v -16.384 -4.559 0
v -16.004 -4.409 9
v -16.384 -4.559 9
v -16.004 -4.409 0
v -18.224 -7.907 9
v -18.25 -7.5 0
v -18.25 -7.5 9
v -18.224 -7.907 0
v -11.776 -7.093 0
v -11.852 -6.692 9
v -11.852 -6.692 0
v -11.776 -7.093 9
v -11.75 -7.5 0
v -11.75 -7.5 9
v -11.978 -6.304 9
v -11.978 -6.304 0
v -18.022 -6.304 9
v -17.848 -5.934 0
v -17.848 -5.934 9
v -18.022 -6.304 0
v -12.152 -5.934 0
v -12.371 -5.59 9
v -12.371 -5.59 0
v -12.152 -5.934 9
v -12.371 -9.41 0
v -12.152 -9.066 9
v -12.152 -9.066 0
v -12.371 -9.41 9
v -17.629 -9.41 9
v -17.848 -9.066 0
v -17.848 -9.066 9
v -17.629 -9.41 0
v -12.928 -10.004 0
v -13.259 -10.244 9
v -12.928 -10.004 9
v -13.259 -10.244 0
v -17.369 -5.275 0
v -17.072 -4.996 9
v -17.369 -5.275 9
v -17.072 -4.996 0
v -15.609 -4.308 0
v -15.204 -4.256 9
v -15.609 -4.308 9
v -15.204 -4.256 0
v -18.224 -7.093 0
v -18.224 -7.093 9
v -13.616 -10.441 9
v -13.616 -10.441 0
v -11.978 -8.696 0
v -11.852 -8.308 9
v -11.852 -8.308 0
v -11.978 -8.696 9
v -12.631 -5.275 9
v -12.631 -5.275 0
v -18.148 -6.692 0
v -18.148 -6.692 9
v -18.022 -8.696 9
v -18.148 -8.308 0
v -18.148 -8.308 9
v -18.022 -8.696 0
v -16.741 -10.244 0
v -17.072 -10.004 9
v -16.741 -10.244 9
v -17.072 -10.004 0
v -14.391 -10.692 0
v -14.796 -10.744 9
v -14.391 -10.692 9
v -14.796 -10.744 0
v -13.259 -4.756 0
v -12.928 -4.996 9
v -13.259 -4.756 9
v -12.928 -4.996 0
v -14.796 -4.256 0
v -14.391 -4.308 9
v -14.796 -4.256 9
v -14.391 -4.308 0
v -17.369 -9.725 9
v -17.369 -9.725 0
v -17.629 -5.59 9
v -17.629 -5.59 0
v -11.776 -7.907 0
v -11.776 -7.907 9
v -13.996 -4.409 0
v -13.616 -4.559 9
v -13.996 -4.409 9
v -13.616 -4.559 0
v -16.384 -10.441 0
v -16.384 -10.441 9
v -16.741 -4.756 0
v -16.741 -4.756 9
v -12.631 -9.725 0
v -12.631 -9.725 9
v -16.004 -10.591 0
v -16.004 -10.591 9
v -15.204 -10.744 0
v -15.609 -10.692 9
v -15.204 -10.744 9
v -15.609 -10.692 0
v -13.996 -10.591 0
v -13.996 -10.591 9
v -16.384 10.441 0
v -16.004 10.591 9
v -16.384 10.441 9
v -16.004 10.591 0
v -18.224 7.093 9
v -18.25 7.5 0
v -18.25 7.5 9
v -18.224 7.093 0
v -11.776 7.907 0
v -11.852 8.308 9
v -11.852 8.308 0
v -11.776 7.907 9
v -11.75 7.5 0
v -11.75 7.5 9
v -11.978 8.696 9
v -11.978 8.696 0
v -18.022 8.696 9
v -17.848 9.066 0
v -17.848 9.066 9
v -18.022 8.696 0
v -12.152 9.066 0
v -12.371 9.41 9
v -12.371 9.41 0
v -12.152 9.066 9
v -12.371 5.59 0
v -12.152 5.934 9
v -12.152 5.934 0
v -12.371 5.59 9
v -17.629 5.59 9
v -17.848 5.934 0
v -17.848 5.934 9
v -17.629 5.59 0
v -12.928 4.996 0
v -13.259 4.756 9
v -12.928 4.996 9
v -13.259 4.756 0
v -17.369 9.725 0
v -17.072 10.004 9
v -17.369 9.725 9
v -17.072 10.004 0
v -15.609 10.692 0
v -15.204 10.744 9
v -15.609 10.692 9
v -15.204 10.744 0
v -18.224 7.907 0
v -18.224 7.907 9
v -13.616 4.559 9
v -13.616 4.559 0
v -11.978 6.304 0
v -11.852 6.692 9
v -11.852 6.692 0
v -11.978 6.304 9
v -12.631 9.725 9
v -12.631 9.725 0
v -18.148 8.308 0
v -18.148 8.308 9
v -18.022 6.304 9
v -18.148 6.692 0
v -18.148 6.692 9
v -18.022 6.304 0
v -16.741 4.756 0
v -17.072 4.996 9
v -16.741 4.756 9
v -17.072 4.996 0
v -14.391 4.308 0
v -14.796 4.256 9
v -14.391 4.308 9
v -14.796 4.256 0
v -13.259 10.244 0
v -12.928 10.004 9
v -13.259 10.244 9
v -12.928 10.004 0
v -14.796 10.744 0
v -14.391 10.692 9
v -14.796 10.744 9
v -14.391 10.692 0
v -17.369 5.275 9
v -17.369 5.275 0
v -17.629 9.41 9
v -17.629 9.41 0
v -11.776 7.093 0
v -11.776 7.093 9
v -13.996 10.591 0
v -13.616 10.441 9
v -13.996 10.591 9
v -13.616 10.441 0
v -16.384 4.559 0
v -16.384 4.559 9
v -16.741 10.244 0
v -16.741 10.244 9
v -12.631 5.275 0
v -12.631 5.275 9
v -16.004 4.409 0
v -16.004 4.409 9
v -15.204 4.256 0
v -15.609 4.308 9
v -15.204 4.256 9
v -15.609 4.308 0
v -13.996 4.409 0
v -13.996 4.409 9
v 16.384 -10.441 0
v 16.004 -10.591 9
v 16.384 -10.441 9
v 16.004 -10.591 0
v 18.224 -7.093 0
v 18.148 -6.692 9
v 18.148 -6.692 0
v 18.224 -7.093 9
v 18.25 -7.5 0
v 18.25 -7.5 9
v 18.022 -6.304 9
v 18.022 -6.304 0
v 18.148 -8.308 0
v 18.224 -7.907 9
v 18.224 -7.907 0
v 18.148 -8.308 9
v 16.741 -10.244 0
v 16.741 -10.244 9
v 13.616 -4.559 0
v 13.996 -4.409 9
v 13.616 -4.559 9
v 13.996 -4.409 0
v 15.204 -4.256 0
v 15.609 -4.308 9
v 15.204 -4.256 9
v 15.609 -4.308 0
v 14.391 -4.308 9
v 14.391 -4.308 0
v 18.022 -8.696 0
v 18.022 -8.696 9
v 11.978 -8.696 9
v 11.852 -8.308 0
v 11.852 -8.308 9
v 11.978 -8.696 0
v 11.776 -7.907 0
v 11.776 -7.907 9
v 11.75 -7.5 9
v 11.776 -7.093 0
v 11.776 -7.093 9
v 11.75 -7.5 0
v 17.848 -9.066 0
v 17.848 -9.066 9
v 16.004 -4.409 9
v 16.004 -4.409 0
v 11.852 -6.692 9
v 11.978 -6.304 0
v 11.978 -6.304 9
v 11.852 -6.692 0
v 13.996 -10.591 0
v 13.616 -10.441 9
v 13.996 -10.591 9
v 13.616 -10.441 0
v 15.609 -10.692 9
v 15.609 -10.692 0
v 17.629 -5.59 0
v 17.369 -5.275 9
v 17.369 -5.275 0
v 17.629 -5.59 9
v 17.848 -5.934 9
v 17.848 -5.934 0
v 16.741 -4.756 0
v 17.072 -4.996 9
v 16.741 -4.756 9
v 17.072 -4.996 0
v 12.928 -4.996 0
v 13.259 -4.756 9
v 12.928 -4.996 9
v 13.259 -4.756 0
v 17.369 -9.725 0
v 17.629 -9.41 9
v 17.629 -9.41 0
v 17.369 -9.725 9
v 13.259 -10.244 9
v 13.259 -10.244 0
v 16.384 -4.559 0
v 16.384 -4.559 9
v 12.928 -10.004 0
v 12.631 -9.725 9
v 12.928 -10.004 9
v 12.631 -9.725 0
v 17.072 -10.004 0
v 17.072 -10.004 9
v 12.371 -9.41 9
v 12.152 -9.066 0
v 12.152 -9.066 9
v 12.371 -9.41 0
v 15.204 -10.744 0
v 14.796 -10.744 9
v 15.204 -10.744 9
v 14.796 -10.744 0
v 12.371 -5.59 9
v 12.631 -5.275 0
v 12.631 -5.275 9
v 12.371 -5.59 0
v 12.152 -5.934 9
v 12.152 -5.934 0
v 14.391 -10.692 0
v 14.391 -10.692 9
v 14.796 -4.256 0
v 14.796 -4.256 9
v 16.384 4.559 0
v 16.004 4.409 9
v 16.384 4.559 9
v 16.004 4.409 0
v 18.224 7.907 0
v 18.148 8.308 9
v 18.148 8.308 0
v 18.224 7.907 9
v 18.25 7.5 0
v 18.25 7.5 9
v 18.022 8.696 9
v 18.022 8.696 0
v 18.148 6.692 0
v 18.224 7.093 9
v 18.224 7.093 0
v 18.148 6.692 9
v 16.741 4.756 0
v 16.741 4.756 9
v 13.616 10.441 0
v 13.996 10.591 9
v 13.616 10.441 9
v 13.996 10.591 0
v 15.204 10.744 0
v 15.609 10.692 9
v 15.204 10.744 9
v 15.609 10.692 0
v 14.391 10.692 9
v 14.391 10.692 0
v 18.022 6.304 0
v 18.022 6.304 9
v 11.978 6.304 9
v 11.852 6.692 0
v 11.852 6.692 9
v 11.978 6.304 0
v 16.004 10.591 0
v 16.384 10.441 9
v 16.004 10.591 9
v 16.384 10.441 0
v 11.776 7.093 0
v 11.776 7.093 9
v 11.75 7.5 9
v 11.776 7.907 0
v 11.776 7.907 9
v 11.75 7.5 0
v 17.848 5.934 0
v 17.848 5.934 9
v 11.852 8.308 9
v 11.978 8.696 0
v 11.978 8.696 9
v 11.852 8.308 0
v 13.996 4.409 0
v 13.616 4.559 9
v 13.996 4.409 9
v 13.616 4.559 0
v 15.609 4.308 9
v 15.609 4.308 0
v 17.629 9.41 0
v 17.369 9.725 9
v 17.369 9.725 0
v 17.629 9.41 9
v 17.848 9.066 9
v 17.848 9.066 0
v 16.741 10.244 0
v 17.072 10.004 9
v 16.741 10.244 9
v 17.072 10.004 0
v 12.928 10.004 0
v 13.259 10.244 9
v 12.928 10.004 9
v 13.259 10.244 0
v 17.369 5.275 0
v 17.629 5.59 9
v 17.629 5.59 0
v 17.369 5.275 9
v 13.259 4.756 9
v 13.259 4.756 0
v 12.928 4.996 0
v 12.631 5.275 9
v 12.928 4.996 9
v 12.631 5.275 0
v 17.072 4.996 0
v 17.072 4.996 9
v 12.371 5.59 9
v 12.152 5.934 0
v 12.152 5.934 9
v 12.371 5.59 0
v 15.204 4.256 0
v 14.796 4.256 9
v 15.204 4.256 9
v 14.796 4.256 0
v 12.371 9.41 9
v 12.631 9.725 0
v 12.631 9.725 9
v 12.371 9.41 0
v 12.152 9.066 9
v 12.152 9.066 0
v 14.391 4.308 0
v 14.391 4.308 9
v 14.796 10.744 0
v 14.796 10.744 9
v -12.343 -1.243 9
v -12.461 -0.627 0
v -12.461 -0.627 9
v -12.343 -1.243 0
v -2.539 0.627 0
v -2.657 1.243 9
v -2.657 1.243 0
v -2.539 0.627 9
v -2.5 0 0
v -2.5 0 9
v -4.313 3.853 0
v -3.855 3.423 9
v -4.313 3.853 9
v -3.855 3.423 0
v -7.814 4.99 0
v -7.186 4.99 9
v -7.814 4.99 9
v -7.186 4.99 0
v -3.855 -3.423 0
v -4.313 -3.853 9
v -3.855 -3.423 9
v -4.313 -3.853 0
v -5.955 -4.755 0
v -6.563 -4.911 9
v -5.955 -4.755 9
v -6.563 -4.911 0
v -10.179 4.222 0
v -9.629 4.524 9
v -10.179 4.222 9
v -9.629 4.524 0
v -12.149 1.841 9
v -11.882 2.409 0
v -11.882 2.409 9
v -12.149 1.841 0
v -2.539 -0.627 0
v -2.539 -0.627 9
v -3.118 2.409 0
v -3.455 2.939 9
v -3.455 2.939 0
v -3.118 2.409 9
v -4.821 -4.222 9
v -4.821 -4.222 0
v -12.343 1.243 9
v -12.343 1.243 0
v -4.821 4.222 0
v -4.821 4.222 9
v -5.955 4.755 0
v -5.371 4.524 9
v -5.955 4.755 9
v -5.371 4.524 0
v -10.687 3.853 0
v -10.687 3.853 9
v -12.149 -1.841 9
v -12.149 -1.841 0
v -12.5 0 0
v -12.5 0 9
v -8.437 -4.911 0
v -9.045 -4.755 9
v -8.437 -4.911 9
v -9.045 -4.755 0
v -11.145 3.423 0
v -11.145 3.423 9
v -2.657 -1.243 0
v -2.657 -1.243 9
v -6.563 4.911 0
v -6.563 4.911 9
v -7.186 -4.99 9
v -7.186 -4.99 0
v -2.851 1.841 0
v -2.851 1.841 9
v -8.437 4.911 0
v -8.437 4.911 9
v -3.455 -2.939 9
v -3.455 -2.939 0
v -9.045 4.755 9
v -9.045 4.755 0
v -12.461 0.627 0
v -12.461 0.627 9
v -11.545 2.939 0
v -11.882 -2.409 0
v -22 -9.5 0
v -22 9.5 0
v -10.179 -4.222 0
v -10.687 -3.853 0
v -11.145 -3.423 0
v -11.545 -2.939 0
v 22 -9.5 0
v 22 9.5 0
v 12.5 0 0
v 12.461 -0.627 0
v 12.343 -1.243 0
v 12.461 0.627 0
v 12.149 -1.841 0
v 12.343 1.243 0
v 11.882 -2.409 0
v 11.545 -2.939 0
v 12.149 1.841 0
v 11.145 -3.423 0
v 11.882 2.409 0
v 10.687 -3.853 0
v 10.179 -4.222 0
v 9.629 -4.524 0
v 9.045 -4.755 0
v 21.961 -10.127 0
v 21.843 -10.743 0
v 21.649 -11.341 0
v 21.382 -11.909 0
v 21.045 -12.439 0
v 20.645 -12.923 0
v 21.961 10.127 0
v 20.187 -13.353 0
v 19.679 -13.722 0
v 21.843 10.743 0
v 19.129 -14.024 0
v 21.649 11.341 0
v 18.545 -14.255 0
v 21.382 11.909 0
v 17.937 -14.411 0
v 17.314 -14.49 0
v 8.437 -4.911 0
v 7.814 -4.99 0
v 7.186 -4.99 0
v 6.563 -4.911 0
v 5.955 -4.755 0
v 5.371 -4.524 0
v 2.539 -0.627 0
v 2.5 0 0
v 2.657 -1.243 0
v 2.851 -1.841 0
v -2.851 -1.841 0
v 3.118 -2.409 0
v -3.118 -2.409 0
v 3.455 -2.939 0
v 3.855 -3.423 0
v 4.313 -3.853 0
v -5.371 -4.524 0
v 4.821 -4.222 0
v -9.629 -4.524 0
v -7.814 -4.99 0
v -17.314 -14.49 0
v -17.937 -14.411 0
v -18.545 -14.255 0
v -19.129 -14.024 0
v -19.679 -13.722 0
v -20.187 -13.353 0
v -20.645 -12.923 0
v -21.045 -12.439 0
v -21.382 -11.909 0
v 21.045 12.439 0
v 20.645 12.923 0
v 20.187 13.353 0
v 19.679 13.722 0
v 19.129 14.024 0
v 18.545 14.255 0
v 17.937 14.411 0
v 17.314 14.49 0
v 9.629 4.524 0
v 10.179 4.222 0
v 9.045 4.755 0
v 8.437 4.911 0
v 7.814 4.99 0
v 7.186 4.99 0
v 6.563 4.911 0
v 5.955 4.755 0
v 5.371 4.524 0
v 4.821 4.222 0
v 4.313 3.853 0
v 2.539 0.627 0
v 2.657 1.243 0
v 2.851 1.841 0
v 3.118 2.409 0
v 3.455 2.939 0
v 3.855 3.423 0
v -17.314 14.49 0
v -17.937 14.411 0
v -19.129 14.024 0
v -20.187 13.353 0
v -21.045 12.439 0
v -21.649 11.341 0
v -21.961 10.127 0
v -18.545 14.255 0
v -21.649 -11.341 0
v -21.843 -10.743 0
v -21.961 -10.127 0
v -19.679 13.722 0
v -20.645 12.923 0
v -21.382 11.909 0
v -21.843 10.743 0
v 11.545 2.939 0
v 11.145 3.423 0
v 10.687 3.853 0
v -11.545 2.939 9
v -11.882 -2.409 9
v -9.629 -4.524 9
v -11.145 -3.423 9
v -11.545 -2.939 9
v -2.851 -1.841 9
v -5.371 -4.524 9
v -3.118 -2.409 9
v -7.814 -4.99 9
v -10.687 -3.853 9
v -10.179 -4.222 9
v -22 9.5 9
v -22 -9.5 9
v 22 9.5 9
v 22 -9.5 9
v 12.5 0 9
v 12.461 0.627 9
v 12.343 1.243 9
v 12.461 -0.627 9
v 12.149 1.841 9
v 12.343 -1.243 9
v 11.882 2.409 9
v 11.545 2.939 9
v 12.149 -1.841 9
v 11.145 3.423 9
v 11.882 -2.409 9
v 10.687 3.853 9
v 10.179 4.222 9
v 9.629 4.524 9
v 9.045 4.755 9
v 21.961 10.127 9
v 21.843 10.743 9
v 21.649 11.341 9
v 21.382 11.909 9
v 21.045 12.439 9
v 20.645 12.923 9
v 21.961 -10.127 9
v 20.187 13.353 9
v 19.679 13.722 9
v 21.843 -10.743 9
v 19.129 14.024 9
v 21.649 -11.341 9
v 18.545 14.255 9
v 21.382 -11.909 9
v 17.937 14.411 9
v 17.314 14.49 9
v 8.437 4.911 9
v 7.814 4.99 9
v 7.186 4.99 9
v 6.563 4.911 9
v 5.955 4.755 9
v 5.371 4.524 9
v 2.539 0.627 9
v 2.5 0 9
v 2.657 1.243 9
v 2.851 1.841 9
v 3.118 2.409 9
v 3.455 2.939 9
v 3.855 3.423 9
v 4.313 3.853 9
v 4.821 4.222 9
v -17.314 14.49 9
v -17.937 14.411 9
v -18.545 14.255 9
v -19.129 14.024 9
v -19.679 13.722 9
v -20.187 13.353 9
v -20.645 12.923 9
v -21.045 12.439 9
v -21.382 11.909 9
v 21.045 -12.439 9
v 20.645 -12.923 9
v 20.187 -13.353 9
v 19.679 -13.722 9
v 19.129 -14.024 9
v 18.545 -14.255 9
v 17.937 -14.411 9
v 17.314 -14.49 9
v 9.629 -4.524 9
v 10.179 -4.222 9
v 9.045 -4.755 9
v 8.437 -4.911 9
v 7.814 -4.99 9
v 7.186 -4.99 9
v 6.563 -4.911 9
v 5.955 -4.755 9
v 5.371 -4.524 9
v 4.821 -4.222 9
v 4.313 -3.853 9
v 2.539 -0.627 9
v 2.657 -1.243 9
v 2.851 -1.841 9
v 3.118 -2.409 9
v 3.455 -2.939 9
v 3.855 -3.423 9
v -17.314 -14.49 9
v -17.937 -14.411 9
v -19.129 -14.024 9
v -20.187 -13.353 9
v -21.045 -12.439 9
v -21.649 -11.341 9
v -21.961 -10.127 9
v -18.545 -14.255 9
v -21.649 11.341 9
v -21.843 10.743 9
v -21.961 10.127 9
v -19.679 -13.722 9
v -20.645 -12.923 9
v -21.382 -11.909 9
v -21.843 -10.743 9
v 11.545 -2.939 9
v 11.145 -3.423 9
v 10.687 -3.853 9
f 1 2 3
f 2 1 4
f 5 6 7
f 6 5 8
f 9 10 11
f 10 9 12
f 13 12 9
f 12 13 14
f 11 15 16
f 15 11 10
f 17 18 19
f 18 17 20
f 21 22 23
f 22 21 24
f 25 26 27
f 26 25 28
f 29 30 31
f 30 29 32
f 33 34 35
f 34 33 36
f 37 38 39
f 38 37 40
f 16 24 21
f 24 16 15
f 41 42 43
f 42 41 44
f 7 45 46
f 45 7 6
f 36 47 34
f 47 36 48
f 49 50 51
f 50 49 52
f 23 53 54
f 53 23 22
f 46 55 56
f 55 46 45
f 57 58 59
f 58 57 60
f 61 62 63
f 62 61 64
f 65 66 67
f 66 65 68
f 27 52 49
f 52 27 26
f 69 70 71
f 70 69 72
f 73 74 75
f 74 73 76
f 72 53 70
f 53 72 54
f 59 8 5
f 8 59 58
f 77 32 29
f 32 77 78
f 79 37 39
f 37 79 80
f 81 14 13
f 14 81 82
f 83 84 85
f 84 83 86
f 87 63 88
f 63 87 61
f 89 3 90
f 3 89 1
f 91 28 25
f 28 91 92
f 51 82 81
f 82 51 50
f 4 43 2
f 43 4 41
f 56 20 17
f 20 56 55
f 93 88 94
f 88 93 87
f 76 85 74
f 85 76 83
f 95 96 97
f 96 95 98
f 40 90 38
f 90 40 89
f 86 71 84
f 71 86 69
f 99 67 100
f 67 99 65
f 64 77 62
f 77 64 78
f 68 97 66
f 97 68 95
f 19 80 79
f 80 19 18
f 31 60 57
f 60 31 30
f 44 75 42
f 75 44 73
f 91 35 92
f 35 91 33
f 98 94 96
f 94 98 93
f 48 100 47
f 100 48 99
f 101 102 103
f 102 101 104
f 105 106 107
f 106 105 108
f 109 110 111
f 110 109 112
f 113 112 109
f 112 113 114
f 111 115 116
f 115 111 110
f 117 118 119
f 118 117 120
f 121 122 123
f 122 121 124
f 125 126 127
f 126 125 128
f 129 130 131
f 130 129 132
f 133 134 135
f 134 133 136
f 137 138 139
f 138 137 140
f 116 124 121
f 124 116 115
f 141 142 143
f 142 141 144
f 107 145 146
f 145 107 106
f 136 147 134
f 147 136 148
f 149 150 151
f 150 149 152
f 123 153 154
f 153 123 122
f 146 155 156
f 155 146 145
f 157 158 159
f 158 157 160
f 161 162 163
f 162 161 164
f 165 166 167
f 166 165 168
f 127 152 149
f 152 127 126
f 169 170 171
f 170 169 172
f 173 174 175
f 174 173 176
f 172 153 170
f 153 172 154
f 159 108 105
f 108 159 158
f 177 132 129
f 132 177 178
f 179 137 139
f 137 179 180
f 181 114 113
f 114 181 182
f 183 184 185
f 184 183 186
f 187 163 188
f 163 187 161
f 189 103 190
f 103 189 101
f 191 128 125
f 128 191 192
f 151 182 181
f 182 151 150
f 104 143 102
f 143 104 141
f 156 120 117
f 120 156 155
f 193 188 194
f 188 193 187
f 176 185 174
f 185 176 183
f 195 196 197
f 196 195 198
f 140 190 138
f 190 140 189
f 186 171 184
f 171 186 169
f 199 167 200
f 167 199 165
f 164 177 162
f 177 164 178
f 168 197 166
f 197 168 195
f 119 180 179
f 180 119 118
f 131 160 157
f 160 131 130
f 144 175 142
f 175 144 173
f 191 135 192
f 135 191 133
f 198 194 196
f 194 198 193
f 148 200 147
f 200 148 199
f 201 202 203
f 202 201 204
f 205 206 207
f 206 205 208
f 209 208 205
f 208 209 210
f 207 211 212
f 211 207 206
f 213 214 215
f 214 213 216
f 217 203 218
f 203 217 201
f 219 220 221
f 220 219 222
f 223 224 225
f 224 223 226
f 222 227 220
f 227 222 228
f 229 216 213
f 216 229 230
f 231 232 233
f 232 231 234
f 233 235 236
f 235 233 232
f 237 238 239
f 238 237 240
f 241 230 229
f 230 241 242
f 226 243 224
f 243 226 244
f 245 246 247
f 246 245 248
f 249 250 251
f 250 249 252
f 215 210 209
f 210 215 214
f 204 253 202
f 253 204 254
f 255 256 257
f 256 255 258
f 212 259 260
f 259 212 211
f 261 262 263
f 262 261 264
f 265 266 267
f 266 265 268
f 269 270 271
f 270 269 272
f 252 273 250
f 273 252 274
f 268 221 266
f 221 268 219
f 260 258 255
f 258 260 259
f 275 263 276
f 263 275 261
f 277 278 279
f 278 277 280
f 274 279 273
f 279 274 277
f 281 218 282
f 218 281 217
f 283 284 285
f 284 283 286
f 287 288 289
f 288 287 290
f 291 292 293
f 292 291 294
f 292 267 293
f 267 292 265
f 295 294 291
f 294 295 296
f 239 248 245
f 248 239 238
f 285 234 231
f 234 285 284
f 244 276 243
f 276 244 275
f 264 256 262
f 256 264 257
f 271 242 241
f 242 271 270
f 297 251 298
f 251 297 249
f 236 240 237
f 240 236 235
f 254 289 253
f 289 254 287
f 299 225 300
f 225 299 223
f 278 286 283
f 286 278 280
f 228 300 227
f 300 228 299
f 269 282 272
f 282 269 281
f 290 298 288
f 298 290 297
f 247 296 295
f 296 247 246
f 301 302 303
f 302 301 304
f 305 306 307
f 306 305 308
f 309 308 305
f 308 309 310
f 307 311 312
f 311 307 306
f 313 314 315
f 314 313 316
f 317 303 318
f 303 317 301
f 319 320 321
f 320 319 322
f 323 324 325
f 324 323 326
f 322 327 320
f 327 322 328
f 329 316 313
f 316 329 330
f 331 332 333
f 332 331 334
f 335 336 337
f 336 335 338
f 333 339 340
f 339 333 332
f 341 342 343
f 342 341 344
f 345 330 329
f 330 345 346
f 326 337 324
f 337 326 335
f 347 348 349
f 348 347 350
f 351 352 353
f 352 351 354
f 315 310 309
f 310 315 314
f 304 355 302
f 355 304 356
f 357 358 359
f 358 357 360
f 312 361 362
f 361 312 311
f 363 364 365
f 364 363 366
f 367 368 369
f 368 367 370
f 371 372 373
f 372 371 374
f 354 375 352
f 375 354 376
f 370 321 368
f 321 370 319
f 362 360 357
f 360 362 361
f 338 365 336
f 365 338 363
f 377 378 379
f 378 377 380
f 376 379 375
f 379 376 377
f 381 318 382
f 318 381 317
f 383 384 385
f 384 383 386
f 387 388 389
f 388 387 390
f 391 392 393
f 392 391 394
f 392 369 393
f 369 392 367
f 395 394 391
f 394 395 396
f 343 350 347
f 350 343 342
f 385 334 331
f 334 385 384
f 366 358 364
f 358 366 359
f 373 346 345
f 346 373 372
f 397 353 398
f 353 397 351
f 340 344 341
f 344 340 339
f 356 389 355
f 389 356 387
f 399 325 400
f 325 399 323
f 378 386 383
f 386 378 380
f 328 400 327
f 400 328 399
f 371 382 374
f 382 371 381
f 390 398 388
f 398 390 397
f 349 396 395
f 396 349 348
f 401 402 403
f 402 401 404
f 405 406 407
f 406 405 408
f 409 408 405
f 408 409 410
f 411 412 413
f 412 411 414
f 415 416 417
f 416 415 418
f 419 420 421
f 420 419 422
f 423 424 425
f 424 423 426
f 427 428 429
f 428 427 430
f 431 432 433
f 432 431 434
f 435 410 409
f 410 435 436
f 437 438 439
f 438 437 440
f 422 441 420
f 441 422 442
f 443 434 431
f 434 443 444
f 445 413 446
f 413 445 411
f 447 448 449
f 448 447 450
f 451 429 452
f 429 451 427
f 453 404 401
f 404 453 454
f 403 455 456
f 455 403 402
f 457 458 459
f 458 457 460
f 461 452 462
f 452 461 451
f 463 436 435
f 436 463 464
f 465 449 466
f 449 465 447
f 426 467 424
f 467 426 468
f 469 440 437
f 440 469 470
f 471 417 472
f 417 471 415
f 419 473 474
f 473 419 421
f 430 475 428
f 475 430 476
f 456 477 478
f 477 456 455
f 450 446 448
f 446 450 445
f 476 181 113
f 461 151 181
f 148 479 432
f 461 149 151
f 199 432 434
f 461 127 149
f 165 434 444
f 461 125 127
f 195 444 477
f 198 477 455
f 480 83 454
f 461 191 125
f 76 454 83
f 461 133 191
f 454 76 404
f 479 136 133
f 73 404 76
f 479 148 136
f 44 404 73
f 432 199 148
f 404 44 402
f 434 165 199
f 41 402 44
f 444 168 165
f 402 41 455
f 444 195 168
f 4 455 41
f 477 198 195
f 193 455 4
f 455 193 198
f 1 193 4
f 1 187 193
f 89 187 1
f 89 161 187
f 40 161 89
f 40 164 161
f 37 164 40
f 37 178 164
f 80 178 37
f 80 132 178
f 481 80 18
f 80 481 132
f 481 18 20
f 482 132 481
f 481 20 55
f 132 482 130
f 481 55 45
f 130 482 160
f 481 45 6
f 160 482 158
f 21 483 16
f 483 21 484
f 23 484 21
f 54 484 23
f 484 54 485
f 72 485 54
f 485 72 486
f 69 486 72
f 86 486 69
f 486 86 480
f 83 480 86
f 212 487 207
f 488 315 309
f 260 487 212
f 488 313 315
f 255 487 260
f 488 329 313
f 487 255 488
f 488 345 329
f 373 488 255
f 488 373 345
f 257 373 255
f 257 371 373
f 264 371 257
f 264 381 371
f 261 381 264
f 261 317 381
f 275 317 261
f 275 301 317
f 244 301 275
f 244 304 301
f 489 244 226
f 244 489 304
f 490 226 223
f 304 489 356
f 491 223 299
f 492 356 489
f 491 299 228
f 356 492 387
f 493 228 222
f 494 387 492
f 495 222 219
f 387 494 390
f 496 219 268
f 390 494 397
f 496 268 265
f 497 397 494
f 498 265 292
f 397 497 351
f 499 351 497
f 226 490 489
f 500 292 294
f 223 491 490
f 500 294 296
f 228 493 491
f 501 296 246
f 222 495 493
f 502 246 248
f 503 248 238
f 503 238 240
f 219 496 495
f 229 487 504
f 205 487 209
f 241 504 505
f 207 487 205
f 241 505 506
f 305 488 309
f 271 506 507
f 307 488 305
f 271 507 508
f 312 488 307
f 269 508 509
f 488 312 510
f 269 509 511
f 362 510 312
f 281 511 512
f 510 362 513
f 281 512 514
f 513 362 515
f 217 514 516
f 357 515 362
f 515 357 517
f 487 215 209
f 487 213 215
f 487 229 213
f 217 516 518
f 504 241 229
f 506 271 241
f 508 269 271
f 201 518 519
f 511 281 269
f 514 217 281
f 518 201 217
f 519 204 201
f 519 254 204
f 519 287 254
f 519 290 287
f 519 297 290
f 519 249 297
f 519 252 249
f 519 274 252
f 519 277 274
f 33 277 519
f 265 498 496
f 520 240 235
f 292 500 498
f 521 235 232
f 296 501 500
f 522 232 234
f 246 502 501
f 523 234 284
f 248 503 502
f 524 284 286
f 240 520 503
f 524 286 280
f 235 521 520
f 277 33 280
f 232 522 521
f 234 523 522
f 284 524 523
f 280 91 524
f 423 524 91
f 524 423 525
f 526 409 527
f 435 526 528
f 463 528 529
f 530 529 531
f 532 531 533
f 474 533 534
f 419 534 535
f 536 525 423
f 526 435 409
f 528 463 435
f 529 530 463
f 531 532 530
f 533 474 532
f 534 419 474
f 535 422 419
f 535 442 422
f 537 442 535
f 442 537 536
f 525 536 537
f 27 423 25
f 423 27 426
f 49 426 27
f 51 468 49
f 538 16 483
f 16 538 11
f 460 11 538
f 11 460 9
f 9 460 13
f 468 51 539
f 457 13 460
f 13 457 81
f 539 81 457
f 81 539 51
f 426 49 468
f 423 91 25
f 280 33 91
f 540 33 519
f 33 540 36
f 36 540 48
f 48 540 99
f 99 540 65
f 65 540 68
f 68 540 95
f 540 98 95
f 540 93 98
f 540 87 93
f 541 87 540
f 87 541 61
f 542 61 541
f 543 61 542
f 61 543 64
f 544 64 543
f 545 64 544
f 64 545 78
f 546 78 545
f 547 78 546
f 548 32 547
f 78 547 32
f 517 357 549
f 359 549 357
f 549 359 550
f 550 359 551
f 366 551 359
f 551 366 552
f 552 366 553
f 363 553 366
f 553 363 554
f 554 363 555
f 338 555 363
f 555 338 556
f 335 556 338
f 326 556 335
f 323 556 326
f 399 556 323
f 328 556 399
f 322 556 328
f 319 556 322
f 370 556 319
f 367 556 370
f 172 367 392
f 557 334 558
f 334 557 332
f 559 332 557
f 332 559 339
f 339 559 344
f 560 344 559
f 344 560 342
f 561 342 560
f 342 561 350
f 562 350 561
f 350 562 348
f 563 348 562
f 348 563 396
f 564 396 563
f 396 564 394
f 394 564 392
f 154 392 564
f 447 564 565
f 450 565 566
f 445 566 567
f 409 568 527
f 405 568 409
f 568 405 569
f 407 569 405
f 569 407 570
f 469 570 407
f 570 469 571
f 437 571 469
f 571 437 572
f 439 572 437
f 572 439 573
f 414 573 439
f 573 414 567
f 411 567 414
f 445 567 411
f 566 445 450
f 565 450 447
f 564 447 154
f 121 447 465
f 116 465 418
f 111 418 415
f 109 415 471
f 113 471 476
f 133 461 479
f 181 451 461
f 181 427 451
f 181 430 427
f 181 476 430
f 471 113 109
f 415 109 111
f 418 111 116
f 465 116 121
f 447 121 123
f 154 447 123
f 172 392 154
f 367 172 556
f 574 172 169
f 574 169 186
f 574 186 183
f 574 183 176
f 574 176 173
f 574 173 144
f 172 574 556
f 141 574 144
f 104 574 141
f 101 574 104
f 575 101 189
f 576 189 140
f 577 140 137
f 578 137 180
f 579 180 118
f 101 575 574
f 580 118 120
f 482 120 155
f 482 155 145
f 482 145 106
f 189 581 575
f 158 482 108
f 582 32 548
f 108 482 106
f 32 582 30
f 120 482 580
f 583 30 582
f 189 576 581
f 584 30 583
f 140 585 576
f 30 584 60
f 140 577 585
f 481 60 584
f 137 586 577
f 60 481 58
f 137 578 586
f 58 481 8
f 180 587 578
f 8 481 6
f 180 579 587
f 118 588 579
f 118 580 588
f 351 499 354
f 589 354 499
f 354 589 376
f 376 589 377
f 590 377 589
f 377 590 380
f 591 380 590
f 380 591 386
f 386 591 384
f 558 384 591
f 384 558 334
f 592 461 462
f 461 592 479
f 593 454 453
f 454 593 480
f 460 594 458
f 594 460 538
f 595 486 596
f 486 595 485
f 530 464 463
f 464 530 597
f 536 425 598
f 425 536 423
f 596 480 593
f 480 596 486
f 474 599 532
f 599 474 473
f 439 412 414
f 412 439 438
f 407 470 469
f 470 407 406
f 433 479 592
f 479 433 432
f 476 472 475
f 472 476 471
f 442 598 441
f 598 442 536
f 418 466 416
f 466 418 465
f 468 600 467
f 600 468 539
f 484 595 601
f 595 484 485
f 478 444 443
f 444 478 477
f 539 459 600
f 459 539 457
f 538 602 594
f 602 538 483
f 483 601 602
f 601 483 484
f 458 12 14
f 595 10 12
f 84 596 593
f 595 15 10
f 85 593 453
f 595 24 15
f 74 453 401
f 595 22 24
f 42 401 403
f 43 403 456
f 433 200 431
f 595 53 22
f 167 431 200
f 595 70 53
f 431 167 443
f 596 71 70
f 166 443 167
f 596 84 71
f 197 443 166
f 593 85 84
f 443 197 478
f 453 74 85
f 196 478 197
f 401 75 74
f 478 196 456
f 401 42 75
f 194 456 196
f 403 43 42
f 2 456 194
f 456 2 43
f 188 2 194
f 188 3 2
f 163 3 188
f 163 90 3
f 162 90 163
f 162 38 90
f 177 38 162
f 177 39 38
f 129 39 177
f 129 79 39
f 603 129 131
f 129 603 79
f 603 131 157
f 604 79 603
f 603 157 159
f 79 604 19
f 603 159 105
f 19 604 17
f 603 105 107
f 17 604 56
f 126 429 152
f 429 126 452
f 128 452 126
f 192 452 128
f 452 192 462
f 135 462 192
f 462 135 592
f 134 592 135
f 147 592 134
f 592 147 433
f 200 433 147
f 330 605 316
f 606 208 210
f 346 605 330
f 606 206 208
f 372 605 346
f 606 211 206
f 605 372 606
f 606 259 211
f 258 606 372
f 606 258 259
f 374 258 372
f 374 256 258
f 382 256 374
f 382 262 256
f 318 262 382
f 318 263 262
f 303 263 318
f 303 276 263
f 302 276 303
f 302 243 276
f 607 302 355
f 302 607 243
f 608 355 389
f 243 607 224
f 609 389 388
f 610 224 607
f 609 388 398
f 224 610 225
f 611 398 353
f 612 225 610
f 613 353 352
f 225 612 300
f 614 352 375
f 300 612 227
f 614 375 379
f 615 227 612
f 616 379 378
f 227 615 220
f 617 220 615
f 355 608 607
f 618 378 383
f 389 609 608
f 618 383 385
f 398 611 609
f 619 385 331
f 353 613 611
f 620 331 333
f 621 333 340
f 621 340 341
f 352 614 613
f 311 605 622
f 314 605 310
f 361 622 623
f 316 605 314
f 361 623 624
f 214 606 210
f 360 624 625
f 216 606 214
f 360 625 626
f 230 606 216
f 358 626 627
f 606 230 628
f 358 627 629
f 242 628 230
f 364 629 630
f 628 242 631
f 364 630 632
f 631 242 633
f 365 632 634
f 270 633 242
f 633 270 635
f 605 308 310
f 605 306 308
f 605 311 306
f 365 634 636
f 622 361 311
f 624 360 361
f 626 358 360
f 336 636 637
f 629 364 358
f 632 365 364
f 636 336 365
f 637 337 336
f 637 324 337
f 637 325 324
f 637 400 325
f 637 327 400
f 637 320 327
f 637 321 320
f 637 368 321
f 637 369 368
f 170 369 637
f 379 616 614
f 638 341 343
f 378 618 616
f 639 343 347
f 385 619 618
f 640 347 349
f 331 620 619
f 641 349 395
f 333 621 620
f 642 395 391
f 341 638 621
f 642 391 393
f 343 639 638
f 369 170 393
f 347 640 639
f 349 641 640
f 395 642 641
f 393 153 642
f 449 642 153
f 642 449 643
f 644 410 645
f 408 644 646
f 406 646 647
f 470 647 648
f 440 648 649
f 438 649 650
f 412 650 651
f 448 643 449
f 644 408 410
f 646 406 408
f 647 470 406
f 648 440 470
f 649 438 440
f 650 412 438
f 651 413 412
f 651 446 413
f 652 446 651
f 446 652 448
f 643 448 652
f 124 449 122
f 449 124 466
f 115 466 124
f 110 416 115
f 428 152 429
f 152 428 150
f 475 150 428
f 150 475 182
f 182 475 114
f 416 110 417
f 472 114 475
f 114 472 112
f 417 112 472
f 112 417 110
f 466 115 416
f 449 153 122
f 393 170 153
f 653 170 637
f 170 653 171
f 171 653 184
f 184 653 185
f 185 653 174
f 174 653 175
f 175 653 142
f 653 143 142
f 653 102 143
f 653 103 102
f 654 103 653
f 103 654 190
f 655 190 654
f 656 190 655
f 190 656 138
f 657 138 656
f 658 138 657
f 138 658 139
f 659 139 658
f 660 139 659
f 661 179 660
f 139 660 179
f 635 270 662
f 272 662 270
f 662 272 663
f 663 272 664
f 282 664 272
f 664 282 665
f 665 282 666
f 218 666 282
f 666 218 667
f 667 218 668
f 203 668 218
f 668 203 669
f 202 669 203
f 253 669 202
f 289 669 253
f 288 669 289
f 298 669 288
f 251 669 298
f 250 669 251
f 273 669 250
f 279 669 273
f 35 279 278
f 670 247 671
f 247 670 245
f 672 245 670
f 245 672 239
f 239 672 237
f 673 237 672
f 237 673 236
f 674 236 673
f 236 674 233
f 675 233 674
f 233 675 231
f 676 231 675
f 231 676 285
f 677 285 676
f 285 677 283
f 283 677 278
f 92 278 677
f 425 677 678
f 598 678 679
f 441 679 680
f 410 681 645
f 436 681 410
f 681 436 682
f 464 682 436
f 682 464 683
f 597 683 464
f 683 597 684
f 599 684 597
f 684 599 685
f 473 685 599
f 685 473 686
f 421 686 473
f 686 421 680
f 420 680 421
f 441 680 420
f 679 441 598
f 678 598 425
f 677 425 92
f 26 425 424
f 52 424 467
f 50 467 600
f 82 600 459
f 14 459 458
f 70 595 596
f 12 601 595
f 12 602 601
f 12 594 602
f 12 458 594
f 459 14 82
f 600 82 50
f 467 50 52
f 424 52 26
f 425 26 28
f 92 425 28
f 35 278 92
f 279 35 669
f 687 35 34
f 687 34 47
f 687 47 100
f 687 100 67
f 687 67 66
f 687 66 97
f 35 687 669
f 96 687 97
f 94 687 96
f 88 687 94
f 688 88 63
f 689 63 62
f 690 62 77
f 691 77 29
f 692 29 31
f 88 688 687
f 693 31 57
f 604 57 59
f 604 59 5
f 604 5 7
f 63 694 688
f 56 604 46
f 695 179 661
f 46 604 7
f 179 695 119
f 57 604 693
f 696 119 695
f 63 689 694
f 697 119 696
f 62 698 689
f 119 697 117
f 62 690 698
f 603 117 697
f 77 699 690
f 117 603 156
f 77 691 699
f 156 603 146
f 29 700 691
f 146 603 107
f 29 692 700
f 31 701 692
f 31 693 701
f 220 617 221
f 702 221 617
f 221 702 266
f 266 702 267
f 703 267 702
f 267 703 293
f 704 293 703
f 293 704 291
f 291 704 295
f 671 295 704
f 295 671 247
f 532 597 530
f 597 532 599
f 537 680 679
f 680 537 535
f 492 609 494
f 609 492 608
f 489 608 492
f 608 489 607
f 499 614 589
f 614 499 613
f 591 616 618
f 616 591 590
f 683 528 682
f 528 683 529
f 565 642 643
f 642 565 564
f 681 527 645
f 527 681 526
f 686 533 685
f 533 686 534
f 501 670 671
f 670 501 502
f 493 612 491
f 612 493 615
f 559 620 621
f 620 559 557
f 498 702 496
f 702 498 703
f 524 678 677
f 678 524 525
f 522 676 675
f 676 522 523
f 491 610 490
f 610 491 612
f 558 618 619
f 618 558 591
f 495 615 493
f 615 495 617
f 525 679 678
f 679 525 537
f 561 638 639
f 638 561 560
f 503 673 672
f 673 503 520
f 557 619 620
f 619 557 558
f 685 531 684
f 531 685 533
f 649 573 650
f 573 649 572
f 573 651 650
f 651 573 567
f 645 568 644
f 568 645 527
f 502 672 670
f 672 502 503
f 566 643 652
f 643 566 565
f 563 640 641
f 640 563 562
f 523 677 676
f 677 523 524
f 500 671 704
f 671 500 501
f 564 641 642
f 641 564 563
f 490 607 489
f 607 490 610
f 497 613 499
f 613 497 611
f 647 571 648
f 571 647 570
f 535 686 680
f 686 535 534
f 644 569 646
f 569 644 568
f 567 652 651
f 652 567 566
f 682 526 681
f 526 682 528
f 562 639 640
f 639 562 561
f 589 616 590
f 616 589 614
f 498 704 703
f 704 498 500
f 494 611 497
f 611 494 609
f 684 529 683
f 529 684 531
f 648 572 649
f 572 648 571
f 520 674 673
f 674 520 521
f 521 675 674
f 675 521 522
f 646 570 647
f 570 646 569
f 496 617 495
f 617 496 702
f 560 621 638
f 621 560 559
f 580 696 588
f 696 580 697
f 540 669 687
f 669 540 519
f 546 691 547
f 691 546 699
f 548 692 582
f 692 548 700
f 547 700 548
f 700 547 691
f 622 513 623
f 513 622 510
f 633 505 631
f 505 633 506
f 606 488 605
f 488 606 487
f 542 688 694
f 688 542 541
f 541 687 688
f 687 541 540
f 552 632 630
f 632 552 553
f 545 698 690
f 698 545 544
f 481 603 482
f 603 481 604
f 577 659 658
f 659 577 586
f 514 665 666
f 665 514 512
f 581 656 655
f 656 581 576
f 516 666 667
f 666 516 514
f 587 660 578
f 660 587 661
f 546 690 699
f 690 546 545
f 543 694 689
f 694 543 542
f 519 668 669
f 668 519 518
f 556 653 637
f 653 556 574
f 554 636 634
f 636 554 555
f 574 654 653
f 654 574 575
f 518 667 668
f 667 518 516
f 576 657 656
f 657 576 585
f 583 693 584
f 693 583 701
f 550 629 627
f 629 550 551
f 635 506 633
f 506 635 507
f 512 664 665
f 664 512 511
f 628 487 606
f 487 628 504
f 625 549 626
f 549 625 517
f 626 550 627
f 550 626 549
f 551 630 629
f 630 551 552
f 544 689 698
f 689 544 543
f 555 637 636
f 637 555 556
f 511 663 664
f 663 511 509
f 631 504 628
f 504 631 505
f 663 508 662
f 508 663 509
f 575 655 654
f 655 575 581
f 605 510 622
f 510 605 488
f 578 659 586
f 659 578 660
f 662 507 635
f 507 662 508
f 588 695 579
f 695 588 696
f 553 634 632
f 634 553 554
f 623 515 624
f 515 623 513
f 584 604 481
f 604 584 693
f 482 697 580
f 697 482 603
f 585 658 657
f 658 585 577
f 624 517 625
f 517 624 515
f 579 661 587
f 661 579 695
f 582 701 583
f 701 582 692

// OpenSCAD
$fn = 50;


difference() {
	union() {
		hull() {
			translate(v = [-17.0000000000, 9.5000000000, 0]) {
				cylinder(h = 9, r = 5);
			}
			translate(v = [17.0000000000, 9.5000000000, 0]) {
				cylinder(h = 9, r = 5);
			}
			translate(v = [-17.0000000000, -9.5000000000, 0]) {
				cylinder(h = 9, r = 5);
			}
			translate(v = [17.0000000000, -9.5000000000, 0]) {
				cylinder(h = 9, r = 5);
			}
		}
	}
	union() {
		#translate(v = [-15.0000000000, -7.5000000000, -100.0000000000]) {
			cylinder(h = 200, r = 3.2500000000);
		}
		#translate(v = [-15.0000000000, 7.5000000000, -100.0000000000]) {
			cylinder(h = 200, r = 3.2500000000);
		}
		#translate(v = [15.0000000000, -7.5000000000, -100.0000000000]) {
			cylinder(h = 200, r = 3.2500000000);
		}
		#translate(v = [15.0000000000, 7.5000000000, -100.0000000000]) {
			cylinder(h = 200, r = 3.2500000000);
		}
		#translate(v = [-7.5000000000, 0, 0]) {
			cylinder(h = 9, r = 5.0000000000);
		}
		#translate(v = [7.5000000000, 0, 0]) {
			cylinder(h = 9, r = 5.0000000000);
		}
	}
}
